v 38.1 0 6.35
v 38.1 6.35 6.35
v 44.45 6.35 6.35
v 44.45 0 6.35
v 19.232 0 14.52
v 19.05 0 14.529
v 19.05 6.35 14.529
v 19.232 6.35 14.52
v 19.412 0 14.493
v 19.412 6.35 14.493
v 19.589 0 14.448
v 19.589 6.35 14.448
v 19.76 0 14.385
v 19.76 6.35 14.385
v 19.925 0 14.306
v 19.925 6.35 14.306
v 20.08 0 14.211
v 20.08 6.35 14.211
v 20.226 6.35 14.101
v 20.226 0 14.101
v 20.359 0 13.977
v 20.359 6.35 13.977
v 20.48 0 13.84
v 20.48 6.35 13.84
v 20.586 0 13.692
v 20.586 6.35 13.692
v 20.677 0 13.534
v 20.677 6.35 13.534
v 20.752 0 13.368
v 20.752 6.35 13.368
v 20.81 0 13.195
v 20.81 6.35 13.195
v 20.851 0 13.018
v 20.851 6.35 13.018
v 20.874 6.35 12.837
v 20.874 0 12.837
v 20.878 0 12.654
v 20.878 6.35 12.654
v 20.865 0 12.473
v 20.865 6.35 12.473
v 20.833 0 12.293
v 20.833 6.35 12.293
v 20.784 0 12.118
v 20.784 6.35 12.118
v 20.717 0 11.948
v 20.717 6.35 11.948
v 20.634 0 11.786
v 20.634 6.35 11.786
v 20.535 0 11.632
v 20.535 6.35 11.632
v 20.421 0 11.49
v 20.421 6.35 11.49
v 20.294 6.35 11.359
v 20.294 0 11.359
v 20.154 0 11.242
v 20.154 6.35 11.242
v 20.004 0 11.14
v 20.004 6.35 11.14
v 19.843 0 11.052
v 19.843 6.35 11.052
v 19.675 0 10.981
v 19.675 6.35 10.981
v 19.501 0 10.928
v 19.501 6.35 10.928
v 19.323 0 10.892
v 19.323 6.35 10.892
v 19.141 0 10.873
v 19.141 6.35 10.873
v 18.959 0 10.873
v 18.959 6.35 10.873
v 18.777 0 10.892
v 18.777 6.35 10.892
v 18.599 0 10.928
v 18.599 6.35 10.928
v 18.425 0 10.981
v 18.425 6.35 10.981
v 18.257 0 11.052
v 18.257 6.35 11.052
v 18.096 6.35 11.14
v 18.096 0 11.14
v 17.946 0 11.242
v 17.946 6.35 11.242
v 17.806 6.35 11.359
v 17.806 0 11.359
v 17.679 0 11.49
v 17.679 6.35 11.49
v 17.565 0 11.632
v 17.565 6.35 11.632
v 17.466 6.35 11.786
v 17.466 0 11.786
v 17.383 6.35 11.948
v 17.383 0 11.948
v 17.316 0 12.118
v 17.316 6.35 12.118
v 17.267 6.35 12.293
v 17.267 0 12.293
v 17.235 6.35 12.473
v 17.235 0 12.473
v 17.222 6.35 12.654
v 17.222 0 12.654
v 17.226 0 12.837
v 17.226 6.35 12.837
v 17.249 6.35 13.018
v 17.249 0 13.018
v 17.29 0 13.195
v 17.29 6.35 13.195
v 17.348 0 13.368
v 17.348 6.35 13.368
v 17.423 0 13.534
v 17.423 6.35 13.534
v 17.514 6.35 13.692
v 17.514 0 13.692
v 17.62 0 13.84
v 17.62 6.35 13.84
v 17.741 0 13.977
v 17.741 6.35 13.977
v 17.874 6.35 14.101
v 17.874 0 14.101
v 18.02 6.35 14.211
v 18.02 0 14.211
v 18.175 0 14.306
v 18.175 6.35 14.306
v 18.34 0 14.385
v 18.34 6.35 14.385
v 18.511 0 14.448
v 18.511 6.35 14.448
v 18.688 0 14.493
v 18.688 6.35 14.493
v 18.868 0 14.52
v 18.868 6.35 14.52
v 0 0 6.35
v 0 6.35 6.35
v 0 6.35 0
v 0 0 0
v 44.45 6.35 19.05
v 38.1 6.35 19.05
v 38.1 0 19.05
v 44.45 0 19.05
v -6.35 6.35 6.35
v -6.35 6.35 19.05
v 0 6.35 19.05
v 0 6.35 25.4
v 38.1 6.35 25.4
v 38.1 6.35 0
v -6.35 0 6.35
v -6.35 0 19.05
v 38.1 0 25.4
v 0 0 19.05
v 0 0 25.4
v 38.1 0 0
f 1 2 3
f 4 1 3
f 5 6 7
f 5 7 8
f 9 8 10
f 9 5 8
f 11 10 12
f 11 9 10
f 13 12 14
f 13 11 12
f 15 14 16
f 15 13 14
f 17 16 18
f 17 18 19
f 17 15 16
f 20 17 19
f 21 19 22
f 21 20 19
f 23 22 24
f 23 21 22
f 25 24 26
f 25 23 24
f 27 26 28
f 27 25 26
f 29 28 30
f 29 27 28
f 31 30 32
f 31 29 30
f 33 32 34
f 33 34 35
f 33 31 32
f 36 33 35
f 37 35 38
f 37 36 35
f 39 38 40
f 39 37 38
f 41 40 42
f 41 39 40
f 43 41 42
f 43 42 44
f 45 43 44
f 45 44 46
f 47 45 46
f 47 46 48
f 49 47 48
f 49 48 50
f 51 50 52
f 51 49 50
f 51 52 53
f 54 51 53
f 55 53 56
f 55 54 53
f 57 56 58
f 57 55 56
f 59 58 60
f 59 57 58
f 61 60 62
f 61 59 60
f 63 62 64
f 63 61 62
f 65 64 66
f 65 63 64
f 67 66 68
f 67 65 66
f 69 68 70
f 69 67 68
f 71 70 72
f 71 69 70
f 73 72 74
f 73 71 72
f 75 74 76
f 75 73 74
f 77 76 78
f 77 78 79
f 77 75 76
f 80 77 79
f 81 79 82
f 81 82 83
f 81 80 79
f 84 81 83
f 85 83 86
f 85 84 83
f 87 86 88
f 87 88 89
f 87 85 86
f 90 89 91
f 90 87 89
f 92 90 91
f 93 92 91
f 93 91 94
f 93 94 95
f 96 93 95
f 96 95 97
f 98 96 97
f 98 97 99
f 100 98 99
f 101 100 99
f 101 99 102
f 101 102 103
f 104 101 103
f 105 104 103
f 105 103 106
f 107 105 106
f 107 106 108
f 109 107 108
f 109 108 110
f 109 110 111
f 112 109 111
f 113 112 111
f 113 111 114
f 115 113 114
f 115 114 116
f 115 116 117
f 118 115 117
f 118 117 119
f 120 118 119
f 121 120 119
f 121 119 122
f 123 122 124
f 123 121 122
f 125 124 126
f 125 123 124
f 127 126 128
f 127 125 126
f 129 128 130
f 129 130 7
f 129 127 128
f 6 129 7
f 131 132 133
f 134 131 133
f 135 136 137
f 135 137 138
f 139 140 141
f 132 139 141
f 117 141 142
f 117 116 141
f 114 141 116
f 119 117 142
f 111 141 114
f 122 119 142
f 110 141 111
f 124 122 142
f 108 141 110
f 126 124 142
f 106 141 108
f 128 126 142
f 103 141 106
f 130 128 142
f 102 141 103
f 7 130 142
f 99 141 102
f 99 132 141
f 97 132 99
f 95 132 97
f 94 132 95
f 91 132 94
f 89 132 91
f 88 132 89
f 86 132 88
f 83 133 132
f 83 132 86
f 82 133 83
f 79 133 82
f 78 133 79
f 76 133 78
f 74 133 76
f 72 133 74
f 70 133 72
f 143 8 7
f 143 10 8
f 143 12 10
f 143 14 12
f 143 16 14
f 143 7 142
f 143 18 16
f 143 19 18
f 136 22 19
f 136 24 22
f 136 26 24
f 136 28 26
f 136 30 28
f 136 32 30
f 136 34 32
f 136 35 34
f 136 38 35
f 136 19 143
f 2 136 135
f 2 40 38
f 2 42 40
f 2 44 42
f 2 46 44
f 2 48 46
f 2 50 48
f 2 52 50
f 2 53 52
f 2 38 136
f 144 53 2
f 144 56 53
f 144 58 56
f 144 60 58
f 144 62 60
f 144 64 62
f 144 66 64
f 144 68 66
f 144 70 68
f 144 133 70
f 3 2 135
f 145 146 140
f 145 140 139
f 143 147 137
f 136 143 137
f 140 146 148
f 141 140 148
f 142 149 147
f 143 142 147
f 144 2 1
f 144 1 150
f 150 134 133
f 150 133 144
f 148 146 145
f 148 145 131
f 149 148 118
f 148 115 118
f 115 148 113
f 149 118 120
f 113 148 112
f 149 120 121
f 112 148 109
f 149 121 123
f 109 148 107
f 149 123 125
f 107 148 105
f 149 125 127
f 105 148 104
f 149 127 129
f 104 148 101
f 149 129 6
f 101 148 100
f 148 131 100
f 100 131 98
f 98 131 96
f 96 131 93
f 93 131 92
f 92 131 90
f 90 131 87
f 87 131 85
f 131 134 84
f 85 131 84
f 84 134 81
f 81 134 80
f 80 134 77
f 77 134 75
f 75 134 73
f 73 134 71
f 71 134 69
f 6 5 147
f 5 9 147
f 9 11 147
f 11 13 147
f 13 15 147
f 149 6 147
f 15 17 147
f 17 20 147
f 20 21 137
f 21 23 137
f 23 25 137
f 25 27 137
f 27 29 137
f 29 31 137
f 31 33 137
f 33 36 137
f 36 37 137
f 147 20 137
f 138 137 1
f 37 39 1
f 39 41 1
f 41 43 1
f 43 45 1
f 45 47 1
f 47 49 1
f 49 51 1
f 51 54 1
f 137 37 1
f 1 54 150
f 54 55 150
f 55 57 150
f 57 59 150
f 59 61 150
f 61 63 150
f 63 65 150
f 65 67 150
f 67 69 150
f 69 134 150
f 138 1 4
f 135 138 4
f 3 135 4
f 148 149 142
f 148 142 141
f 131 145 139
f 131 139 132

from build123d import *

# Parameters (mm, degrees)
SKETCH1_W           = 38.1
SKETCH1_H           = 25.4
SKETCH1_R           = 1.8288
SKETCH1_W_2         = 6.35
SKETCH1_H_2         = 12.7
BOSS_EXTRUDE1_DEPTH = 6.35


with BuildPart() as part:
    # Sketch1 → Boss-Extrude1 (new body)
    # profile 1 of 3: a face of its own
    with BuildSketch(Plane(origin=(0, 0, 0), x_dir=(1, 0, 0), z_dir=(0, 1, 0))):
        with Locations((19.05, -12.7)):
            Rectangle(SKETCH1_W, SKETCH1_H)
        with Locations(Location((19.05, -12.7, 0), (0, 0, 270))):
            Circle(SKETCH1_R, mode=Mode.SUBTRACT)
    # profile 2 of 3: a face of its own
    with BuildSketch(Plane(origin=(0, 0, 0), x_dir=(1, 0, 0), z_dir=(0, 1, 0))):
        with Locations((41.275, -12.7)):
            Rectangle(SKETCH1_W_2, SKETCH1_H_2)
    # profile 3 of 3: a face of its own
    with BuildSketch(Plane(origin=(0, 0, 0), x_dir=(1, 0, 0), z_dir=(0, 1, 0))):
        with Locations((-3.175, -12.7)):
            Rectangle(SKETCH1_W_2, SKETCH1_H_2)
    extrude(amount=BOSS_EXTRUDE1_DEPTH)


solid = part.part
